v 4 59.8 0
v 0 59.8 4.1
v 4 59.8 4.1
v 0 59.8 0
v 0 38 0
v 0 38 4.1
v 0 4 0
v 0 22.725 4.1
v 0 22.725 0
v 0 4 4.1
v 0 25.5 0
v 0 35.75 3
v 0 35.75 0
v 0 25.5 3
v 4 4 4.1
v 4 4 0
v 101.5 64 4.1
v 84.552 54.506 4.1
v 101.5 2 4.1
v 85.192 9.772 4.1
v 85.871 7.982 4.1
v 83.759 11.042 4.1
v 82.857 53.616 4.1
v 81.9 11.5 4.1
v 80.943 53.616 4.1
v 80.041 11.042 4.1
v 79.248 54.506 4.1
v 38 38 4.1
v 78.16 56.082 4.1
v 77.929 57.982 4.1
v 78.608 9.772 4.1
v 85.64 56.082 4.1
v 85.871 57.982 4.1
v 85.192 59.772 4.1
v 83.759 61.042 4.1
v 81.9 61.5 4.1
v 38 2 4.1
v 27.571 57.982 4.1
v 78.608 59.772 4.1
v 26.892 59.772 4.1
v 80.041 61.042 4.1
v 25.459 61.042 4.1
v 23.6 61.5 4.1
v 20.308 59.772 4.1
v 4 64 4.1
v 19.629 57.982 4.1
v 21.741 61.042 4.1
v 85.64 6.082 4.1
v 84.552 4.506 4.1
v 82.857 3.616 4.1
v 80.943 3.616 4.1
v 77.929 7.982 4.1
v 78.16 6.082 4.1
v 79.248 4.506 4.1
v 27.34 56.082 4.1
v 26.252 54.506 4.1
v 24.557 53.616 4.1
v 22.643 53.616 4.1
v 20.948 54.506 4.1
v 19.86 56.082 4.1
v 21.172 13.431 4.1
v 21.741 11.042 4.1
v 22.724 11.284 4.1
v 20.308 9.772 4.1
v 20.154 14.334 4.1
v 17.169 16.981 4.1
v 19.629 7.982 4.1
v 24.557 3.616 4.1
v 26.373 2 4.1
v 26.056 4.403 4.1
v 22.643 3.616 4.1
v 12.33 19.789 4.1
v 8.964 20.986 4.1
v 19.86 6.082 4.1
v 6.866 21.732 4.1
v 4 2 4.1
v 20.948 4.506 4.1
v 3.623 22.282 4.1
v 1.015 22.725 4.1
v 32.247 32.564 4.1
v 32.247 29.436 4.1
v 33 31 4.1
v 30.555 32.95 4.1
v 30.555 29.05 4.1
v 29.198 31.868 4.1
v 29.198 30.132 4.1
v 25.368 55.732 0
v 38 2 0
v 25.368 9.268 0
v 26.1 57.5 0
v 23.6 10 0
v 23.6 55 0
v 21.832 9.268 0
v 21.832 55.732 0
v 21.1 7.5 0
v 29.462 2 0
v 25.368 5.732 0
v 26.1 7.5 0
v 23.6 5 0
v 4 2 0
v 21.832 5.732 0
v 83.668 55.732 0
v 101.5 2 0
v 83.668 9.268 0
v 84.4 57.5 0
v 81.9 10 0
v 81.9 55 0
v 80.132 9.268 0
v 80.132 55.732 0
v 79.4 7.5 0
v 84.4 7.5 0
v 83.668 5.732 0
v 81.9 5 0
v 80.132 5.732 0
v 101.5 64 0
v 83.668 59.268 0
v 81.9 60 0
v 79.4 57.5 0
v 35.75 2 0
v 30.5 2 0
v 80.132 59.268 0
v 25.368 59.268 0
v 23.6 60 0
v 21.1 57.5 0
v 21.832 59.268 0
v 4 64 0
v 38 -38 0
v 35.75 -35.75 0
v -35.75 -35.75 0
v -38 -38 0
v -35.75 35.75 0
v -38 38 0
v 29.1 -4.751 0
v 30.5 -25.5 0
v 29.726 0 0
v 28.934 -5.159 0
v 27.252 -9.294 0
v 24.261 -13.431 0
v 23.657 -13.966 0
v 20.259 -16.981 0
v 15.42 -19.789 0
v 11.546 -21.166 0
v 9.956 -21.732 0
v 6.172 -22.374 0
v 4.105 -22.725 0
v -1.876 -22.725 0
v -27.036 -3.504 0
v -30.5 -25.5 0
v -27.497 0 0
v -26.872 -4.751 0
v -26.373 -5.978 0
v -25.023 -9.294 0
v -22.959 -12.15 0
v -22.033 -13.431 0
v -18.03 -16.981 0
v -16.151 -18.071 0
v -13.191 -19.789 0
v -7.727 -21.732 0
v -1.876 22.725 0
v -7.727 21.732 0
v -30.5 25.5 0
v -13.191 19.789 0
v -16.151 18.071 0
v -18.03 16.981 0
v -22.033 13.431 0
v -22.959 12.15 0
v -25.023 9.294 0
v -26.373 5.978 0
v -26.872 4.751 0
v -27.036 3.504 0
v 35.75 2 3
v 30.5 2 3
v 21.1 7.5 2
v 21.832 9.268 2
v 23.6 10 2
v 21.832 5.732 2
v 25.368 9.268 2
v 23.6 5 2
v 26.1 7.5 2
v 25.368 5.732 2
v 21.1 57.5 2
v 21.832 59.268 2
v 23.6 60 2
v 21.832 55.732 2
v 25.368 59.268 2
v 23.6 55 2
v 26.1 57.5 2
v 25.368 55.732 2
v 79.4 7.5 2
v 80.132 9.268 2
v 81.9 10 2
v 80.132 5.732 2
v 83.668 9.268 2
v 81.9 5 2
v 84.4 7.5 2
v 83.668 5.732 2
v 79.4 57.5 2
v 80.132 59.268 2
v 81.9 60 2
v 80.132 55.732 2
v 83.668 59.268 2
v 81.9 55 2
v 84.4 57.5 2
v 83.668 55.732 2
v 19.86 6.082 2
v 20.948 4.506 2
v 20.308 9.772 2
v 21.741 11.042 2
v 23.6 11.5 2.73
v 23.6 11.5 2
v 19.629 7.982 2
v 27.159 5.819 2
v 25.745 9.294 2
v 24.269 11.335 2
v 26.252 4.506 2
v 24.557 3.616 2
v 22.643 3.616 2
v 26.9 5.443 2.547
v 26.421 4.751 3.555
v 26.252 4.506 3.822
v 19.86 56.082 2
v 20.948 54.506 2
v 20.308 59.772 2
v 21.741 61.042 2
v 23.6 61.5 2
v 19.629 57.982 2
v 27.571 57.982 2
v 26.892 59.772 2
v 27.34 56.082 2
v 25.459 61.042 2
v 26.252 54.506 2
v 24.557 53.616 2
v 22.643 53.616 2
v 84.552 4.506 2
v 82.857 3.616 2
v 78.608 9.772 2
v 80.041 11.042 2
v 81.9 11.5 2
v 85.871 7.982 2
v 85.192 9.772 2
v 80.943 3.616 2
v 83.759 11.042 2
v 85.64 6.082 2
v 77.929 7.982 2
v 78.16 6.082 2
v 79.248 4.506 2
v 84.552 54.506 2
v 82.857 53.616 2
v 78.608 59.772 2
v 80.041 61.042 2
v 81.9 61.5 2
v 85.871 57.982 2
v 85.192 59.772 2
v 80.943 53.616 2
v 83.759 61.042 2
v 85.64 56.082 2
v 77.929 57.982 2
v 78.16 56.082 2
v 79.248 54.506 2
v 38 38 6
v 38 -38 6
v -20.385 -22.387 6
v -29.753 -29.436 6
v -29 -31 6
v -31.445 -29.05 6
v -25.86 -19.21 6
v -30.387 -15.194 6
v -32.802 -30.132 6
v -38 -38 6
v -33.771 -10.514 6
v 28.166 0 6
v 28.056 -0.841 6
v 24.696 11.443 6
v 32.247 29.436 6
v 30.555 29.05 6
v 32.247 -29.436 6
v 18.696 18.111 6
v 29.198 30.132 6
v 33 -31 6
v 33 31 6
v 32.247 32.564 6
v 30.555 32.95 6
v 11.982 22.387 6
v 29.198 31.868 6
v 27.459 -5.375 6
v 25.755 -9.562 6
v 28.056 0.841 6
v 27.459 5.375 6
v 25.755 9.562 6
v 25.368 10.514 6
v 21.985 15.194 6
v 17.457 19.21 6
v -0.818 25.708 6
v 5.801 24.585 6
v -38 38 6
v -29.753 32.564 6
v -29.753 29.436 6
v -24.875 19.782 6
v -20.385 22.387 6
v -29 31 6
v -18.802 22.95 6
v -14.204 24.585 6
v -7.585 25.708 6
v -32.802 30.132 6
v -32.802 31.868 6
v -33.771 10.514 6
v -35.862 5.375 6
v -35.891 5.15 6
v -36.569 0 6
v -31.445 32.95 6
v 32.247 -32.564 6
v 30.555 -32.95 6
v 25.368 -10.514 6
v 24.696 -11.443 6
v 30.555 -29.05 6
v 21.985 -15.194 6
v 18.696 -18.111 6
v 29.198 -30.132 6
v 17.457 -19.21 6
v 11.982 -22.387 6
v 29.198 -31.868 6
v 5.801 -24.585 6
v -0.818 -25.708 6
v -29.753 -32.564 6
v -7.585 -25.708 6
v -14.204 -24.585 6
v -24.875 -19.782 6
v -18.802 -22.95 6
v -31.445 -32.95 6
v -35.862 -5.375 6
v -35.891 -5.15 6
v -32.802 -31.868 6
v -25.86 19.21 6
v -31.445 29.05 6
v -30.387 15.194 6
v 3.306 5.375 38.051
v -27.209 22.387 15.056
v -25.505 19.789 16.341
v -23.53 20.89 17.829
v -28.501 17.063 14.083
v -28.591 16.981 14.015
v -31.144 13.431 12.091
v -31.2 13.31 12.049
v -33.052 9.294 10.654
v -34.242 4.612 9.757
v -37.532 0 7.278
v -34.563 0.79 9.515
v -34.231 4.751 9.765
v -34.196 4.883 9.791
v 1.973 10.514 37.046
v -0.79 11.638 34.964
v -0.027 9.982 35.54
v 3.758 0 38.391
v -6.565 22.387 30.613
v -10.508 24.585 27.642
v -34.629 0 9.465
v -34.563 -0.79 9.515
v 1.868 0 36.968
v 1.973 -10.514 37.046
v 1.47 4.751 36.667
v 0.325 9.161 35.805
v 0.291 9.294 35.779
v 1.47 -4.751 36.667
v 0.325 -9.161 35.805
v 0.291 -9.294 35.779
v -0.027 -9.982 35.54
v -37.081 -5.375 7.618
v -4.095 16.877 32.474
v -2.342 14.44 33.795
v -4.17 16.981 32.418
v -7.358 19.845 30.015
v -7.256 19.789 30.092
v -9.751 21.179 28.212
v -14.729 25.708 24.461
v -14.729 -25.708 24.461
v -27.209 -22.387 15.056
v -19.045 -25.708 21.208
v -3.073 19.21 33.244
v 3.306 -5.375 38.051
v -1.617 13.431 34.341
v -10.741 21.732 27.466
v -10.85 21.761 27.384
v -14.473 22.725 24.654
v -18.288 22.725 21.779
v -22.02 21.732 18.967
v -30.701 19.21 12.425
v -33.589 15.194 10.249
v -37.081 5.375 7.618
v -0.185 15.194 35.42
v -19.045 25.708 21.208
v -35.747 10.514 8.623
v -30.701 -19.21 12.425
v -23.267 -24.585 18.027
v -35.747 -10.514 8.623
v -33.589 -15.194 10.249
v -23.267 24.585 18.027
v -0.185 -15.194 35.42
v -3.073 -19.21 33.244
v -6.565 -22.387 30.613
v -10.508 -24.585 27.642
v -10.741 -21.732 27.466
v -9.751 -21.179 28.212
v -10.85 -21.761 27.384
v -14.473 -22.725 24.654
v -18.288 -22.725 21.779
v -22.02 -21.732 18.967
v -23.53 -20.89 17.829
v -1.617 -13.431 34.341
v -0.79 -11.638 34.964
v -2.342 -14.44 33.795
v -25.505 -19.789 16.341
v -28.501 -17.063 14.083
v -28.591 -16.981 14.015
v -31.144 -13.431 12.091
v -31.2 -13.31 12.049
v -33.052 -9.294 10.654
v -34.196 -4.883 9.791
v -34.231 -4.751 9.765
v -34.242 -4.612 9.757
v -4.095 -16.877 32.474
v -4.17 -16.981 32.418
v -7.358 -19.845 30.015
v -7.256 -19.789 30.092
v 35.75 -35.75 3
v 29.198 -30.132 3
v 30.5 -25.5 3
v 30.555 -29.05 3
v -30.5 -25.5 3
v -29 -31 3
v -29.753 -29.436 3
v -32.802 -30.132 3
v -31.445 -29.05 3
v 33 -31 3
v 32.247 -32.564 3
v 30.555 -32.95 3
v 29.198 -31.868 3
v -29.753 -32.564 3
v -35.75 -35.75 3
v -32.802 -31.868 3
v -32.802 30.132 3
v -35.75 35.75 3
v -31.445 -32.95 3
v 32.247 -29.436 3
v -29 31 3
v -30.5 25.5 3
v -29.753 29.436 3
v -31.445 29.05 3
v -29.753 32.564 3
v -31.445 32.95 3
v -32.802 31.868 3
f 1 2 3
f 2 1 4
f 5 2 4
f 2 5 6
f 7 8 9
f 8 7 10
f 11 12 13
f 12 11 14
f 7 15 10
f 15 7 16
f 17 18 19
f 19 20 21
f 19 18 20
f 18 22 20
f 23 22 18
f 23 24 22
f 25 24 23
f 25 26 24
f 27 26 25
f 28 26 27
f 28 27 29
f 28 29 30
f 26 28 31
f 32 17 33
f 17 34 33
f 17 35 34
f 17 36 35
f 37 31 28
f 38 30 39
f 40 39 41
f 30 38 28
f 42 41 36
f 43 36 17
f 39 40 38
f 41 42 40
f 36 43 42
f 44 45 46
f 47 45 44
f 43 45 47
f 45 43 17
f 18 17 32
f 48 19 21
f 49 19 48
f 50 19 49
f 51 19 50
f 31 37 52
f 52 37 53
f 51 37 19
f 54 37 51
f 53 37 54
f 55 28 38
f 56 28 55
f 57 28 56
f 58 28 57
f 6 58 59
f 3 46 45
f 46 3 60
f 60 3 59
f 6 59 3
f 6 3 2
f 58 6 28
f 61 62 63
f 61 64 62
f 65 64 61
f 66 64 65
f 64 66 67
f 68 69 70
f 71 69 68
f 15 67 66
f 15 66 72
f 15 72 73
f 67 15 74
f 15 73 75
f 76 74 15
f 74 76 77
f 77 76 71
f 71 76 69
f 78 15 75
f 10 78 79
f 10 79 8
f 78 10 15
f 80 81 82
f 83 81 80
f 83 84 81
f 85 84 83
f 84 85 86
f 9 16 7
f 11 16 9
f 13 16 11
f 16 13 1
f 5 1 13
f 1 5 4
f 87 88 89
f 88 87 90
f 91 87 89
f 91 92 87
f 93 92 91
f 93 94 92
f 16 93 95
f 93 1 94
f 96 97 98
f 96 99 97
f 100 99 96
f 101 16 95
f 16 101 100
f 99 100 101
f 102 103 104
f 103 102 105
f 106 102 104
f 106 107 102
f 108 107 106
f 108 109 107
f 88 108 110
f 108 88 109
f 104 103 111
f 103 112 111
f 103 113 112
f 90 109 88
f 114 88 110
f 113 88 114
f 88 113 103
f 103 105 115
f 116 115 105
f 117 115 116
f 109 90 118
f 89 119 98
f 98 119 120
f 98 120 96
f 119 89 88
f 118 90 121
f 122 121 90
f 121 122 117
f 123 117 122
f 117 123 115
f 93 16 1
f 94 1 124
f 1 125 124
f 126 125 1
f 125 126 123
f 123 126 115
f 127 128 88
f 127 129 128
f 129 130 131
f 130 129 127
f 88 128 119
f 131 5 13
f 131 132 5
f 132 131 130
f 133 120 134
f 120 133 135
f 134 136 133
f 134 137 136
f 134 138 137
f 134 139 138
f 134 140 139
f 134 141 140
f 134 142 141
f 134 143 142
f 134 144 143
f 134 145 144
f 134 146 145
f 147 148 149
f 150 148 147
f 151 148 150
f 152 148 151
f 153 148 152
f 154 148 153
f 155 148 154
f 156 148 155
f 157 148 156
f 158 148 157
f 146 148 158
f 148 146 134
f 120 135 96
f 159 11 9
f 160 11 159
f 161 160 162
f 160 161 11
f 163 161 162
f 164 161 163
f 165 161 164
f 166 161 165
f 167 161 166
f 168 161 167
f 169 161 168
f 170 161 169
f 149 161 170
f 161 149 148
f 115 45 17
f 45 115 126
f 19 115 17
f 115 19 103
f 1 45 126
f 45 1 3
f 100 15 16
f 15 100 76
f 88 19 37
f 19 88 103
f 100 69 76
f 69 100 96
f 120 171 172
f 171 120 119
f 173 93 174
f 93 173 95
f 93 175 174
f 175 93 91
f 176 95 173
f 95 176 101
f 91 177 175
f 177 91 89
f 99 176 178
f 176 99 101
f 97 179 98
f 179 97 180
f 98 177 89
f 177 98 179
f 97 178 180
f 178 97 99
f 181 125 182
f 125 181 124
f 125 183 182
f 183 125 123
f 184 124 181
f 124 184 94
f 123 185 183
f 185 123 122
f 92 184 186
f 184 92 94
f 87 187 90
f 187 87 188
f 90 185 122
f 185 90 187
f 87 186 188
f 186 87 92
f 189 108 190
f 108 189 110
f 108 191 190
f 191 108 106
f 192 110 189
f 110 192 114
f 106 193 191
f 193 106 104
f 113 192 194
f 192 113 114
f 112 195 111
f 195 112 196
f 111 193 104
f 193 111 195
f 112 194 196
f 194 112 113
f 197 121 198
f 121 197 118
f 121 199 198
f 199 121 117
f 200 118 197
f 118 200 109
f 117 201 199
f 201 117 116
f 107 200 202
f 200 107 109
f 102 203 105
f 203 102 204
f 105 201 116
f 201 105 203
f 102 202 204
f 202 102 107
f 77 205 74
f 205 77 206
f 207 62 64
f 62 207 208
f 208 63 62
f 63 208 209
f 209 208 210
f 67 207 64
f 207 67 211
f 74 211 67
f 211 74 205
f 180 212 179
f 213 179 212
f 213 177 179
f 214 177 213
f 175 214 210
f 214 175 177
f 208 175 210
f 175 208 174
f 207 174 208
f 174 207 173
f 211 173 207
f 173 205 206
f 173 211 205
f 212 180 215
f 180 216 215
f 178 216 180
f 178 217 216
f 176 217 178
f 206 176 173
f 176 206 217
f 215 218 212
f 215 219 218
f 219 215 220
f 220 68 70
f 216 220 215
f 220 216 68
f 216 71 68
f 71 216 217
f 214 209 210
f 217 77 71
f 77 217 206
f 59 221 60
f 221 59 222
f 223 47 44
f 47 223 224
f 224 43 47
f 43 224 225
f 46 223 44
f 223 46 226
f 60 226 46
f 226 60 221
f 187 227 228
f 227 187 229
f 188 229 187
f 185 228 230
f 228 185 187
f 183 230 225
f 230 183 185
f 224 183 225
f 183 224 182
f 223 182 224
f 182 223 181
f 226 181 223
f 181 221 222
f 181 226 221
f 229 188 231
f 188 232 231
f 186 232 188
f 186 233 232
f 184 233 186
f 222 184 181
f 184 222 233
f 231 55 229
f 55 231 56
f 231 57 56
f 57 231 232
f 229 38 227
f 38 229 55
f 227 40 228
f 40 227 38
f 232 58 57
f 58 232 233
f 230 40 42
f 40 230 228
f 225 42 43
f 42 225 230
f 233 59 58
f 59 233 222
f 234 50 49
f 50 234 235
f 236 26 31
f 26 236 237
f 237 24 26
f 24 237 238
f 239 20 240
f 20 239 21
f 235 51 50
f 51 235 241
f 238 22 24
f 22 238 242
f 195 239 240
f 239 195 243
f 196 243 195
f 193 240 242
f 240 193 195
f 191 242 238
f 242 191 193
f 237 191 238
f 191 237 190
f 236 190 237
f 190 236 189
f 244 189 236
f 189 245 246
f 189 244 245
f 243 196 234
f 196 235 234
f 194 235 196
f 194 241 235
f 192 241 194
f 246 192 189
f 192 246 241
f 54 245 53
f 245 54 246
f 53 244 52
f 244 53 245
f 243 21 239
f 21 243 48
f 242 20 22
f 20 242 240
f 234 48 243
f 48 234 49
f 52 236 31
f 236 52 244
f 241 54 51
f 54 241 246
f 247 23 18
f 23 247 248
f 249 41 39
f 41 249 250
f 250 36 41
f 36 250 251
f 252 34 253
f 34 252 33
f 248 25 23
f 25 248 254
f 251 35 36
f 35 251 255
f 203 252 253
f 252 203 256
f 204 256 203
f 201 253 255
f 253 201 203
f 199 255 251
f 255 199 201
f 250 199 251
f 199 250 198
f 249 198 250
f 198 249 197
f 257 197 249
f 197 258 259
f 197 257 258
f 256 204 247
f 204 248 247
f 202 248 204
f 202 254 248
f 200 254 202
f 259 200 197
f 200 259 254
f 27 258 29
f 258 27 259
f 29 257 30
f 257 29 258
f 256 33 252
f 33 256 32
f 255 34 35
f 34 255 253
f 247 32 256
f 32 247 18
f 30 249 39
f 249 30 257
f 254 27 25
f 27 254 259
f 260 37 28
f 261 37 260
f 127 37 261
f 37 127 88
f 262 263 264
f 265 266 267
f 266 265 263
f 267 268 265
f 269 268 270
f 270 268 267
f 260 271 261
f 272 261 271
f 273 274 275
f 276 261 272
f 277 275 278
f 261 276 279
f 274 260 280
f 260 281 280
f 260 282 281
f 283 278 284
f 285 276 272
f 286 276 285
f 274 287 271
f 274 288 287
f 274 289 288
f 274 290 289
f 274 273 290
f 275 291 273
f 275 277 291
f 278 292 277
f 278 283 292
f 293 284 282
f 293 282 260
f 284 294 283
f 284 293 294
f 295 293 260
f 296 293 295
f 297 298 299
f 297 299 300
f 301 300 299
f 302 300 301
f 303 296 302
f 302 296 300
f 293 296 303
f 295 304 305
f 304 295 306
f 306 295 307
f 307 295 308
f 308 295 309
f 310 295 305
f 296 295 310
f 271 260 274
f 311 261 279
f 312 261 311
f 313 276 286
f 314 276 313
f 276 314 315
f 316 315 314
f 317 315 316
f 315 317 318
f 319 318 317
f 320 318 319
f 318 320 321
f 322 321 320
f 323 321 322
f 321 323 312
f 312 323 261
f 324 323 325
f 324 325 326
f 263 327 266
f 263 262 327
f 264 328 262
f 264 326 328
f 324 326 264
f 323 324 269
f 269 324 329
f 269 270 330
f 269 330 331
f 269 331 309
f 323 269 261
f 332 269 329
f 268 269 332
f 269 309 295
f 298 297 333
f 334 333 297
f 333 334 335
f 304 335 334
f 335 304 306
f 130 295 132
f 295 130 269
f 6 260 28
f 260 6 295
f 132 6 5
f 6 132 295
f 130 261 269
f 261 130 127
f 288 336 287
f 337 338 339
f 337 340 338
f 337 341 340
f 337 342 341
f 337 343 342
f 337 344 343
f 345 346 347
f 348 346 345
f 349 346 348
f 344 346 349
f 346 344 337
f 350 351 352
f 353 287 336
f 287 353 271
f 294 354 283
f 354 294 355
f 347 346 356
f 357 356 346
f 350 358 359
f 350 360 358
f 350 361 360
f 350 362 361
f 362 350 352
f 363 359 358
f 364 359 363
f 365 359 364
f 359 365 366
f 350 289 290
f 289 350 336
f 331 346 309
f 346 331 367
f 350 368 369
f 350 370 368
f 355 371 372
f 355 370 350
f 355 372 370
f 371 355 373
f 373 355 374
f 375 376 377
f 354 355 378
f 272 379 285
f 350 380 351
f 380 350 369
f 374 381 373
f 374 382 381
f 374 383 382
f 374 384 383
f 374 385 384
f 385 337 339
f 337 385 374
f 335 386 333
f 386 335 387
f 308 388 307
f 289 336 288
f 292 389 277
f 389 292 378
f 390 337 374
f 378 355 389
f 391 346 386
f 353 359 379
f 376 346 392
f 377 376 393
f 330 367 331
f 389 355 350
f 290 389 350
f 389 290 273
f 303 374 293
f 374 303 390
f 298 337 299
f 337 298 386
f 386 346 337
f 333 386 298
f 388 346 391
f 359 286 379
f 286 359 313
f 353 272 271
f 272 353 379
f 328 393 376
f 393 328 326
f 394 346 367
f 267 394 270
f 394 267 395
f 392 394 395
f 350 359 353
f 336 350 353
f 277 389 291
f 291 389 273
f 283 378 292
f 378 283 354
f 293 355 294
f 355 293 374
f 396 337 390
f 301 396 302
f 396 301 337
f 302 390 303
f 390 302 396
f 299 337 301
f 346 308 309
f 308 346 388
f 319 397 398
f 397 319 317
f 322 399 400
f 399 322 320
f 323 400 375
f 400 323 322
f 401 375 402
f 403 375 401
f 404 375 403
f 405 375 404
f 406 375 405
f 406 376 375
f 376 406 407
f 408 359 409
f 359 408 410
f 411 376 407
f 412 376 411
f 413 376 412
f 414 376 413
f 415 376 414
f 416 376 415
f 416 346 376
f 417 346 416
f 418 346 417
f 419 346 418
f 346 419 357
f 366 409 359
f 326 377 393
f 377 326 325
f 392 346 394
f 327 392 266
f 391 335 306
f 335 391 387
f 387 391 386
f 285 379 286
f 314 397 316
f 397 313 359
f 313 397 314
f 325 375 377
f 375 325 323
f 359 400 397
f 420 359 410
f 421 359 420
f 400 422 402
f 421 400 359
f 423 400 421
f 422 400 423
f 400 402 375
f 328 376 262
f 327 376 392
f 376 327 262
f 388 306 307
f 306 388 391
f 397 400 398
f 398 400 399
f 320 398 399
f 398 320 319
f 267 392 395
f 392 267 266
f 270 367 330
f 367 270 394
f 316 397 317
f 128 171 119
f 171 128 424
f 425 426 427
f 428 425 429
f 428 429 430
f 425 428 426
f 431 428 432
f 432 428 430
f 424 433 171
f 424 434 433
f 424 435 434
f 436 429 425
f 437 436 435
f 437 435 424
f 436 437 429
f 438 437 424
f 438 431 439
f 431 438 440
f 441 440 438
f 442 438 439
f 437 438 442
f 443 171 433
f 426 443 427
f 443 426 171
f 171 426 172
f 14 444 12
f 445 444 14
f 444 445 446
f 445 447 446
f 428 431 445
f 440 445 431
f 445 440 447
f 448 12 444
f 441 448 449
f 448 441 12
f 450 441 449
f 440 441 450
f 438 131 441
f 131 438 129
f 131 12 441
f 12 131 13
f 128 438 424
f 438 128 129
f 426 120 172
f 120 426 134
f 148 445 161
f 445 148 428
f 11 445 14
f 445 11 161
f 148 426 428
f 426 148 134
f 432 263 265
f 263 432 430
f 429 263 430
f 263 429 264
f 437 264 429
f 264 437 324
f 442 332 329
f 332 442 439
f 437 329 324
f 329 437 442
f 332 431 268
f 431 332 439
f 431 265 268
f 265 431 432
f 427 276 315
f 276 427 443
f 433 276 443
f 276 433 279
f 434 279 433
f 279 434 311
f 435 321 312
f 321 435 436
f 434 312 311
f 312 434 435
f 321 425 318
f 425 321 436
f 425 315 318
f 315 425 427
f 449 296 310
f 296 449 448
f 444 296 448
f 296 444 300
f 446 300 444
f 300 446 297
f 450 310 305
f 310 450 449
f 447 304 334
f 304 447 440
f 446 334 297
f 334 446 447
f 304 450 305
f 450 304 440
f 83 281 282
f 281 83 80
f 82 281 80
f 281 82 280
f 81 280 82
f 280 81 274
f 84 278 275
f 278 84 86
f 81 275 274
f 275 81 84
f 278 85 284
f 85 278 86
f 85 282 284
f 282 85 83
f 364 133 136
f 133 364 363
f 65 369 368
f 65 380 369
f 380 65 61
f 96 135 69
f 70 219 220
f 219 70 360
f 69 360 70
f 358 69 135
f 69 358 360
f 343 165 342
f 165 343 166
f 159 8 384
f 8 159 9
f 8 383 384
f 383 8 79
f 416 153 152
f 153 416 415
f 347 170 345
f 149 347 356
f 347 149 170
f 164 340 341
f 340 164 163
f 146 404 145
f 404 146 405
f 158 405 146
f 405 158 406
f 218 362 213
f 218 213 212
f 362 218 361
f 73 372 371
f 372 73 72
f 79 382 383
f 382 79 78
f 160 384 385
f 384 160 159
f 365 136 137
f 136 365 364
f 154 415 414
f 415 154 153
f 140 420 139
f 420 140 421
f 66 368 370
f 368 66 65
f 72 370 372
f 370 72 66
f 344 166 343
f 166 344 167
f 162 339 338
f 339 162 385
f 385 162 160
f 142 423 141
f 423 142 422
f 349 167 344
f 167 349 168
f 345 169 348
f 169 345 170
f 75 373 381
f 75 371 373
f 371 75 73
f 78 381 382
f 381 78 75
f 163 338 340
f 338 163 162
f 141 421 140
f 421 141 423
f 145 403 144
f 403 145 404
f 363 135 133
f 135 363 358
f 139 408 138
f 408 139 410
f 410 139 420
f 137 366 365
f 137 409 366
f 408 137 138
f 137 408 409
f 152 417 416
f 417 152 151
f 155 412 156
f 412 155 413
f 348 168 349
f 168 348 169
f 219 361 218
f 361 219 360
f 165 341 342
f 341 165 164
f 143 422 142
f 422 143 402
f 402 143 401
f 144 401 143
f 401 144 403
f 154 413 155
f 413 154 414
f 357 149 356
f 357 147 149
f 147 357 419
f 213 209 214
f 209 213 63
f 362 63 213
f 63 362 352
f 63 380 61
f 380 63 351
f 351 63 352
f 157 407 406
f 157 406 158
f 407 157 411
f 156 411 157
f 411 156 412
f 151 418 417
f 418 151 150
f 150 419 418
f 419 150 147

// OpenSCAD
// file: Tapa.scad
batX = 0;//22.4Ancho frente
batY = 21.4;//Alto frente
batZ = 90.5;//Profundo


pared = 4;
pared2 = 2*pared;
medPared = pared/2;

raspX = 58;
raspY = 18;
raspZ = 84.5;

h = batY+pared2;

mainAreaX = raspX+batX+pared2; 
mainAreaY = batY+pared2;
mainAreaZ = batZ+pared+5+4;

mainAreaIntX = mainAreaX-pared2;
mainAreaIntY = mainAreaY-pared;
mainAreaIntZ = mainAreaZ-pared;

x1 = pared+3.5;
z1 = 23.6;
x2 = x1+50;
x3 = pared+3.5;
z3 = 81.9;

cejaHorPosX = mainAreaX-batX-pared;
cejaVertPosX = mainAreaX-pared-2;
torH = batY+pared;


rotate([90,0,90])
doALl();



module doALl(){
difference()
{
	translate([medPared,0,pared])
	doTop();	

	translate([0,-1,0])
	baseBatTorn(2.5);

	translate([0,2,0])
	baseBatTorn(4);

}
}

module doTop()
{
	translate([2,0,-4])
	cube([
			mainAreaX-pared-6.2,
			pared+0.1,
			mainAreaZ-pared2+medPared
	  	]);
	cube([
			mainAreaX-pared,
			pared+0.1,
			mainAreaZ-pared2+medPared
	  	]);
}



module baseBatTorn(r)
{
//Tornillos
translate([x1,0,z1])
tornCyl(r);
translate([x2,0,z1])
tornCyl(r);
translate([x1,0,z3])
tornCyl(r);
translate([x2,0,z3])
tornCyl(r);
}











module tornCyl(rad)
{
	rotate([-90,0,0])
	{
		cylinder(r=rad,torH);
	}
}
// file: ../../library.scad
module tubo(
	h/*Altura*/,
	w/*Pared*/,
	d/*Diametro*/
){
  difference()
  {
    cylinder(r=(d/2), h);
    translate([0,0,-0.1])
    cylinder(r=(d/2)-(2*w), h+0.2);
  }
}

module huyoMasPared(
	d/*Diametro del hoyo*/,
	w/*Pared*/,
	h/*Altura*/,
){
  difference()
  {
    cylinder(r=((d+(2*w))/2), h);
    translate([0,0,-0.1])
    cylinder(r=(d/2), h+0.2);
  }
}

module cuboMasPared(
    w1, //Largo
    w2, //Ancho
    p1, //Pared
    p2, //Pared
    h   //Alto
)
{    
    difference()
    {
        translate([-(w1+(p1*2))/2,-(w2+(p2*2))/2,0])
        cube([(w1+(p1*2)),(w2+(p2*2)),h]);
        
        translate([-w1/2,-w2/2,-0.2])
        cube([w1,w2,h*2]);
        
    }
    
    
}

soporteW = 0.7;

module soporteCylinder()
{
  difference()
  {
	cylinder(r=radio,altura);

	translate([0,0,-0.1])
	cylinder(r=radio-soporteW,altura+0.2);
  }

  if(true){
  difference()
  {
	cylinder(r=radio+0.75,1);

	translate([0,0,-0.1])
	cylinder(r=radio-0.75,1.25);
  }}

}

module soporteOval()
{
  difference()
  {
	oval(w=ancho, h=largo, height=alto, center = false);

	translate([0,0,-0.1])
	oval(ancho-soporteW, largo, alto+0.2);
  }

  difference()
  {
	oval(w=ancho+1, h=largo+1, height=1, center = false);

	translate([0,0,-0.1])
	oval(w=ancho-1, h=largo-1, height=1.25, center = false);
  }

}


module oval(w,h, height, center = false)
{
  scale([1, h/w, 1]) cylinder(h=height, r=w, center=center);
}
// file: Frame.scad
include <Diffracter.scad>

frameW = 80-1.5;//Real hole width - burr
frameH = 75-1.5;//Real hole height - burr
frameD = 2.5;

winW = frameW - 8;
winH = frameH - 16;

slideW = winW + 4;
slideH = winH + 10;
slideD = 0.8;

//Activate this to display
if(false)
{
  Frame();
}

module Frame()
{
difference()
{

  translate([-frameW/2,-frameH/2,0])
  cube([frameW,frameH,frameD]);

  //areaSello();
  translate([-winW/2,-winH/2,-0.1])
  cube([winW,winH,frameD*2]);

  translate([-slideW/2,-slideH/2,frameD-slideD])
  cube([slideW,slideH,2]);

}
}


module areaSello()
{
  //cylinder(r=(raspSellR/2)-1,frameD);

  translate([-(frameW)/2,-(frameH)/2,0])
  cube([frameW,frameH,frameD]);
}
// file: Diffracter.scad
include <Tapa.scad>
include <../../library.scad>


bigW = 70;
ori = bigW/2;
raspSellR = 59;
tuboH = 140;
H = 18.5;
selloH = 7;
tornR = 2;

huecoPared = 12;
huecoH = 22;

//Activate this to display
if(false)
{
translate([0,0,bigW/2])
rotate([0,90,0])
diffracter();


//soporteCylinder(radio=25.2,altura=3.8);

}


module diffracter(){	

difference(){

//Bloque
translate([-bigW/2,-bigW/2,0])
cube([bigW,bigW,H]);


translate([
						-(bigW-huecoPared)/2,
						-(bigW-huecoPared)/2,
						(huecoH/2)
					])
		cube([
					bigW-huecoPared,
					bigW-huecoPared,
					H-huecoH]
				);


//Diffractador
translate([-27.25,-32.5,-0.1])
cube([54.5,65,5.6]);

//Macro
translate([0,0,5.4])
cylinder(r=(54.5/2),8.2);

//Sello de raspberry
//translate([0,0,-0.1])
//cylinder(r=(raspSellR/2)+1,2);

//Tubo
//translate([0,0,-0.1])
//cylinder(r=(52/2),200);

//Tornillos abajo
translate([-ori+4,-ori+4,-0.1])
cylinder(r=tornR,20);
translate([ori-4,-ori+4,-0.1])
cylinder(r=tornR,20);
translate([-ori+4,ori-4,-0.1])
cylinder(r=tornR,20);
translate([ori-4,ori-4,-0.1])
cylinder(r=tornR,20);

//Hueco
cylinder(r=25.5,H+1);

//Tornillos caja
translate([0,0,(tuboH/2)-7])
rotate([0,90,0])
tornillosArriba();

//Tornillo tripie
translate([-ori-0.1,0,(tuboH/2)+7])
rotate([0,90,0])
cylinder(r=5/2,5.31);

//Sello hembra
translate([0,0,H-3])
cylinder(r=30,4);

}

//Sello cobertura
//translate([0,0,H-1])
//huyoMasPared(58,3,3);


}
// main file
include <Diffracter.scad>
include <Frame.scad>
include <../../library.scad>

// 3.15° for every 100 l/mm

angulo = 37;

coberW = bigW+6;
coberH = 6;
coberOffset = 1;//Posición del tubo
coberOffset2 = -3;//Altura del tubo (-7)->(-8)
cobeSellH = 4;
cobeSellW1 = 7;
cobeSellW2 = 7;

torrRadio = 2;





//soporteCylinder(radio=29,altura=coberH);	
//soporteOval(ancho=28, largo=25, alto=coberH);
//soporteCylinder(radio=34,altura=coberH);
//frameSello();


difference()
{
createAll();

translate([-100,-100,-200])
cube([200,200,200]);

}

module createAll()
{

difference()
{
areaExterna();

//Tubo Interno
translate([15-coberOffset,0,-14.1+coberOffset2])
rotate([0,-angulo,0])//3.15 cada 100 (antes 40)
cylinder(r=(45.7)/2,52);

//Cuadro de la pared
creaContorno();
translate([-bigW/2,-bigW/2,-40+coberH-6])
cube([bigW,bigW,40]);

//Tornillos
tornPass();

//Contorno
creaContorno();

}

//creaSelloMacho();

}




module creaContorno()
{

 difference()
 {
   translate([-(coberW-4.5)/2,-(coberW-4.5)/2,-3])
   cube([(coberW-4.5),(coberW-4.5),coberH]);

   translate([-(coberW-15)/2,-(coberW-25)/2,-3])
   cube([(coberW-15),(coberW-25),coberH]);
 }

/*
 translate([-(coberW-6)/2,-(coberW-6)/2,-3])
 cube([(coberW-6),8.8,coberH]);

 translate([-(coberW-5)/2,((coberW-5)/2)-8.5,-3])
 cube([(coberW-5),10,coberH]);

 translate([(-(coberW-5)/2),-((coberW-6)/2),-3])
 cube([5.5,(coberW-6),coberH]);

 translate([((coberW-5.5)/2)-5,-((coberW-6)/2),-3])
 cube([5.5,(coberW-6),coberH]);
*/
}



module creaSelloMacho()
{

 translate([0,0,coberH-cobeSellH])
 difference()
 {
  areaSello(frameD=cobeSellH);

  translate([-(frameW-cobeSellW1)/2,-(frameH-cobeSellW2)/2,-0.1])
  cube([frameW-cobeSellW1,frameH-cobeSellW2,cobeSellH+1]);
 }
}

module areaExterna()
{
//Cobertura
translate([-coberW/2,-coberW/2,0])
cube([coberW,coberW,coberH]);

//TuboExterno
translate([13-coberOffset,0,-12.5+coberOffset2])
rotate([0,-angulo,0])/*3.15 cada 100 (antes 40)*/
cylinder(r=(45.7+6)/2,48);
}

module recorteOval()
{
  translate([-0.4,0,-1.9])
  oval(26.8,22.9, 15, center = false);
}

module tornPass()
{
translate([-ori+4,-ori+4,-0.1])
cylinder(r=torrRadio,30);
translate([ori-4,-ori+4,-0.1])
cylinder(r=torrRadio,30);
translate([-ori+4,ori-4,-0.1])
cylinder(r=torrRadio,30);
translate([ori-4,ori-4,-0.1])
cylinder(r=torrRadio,30);
}
